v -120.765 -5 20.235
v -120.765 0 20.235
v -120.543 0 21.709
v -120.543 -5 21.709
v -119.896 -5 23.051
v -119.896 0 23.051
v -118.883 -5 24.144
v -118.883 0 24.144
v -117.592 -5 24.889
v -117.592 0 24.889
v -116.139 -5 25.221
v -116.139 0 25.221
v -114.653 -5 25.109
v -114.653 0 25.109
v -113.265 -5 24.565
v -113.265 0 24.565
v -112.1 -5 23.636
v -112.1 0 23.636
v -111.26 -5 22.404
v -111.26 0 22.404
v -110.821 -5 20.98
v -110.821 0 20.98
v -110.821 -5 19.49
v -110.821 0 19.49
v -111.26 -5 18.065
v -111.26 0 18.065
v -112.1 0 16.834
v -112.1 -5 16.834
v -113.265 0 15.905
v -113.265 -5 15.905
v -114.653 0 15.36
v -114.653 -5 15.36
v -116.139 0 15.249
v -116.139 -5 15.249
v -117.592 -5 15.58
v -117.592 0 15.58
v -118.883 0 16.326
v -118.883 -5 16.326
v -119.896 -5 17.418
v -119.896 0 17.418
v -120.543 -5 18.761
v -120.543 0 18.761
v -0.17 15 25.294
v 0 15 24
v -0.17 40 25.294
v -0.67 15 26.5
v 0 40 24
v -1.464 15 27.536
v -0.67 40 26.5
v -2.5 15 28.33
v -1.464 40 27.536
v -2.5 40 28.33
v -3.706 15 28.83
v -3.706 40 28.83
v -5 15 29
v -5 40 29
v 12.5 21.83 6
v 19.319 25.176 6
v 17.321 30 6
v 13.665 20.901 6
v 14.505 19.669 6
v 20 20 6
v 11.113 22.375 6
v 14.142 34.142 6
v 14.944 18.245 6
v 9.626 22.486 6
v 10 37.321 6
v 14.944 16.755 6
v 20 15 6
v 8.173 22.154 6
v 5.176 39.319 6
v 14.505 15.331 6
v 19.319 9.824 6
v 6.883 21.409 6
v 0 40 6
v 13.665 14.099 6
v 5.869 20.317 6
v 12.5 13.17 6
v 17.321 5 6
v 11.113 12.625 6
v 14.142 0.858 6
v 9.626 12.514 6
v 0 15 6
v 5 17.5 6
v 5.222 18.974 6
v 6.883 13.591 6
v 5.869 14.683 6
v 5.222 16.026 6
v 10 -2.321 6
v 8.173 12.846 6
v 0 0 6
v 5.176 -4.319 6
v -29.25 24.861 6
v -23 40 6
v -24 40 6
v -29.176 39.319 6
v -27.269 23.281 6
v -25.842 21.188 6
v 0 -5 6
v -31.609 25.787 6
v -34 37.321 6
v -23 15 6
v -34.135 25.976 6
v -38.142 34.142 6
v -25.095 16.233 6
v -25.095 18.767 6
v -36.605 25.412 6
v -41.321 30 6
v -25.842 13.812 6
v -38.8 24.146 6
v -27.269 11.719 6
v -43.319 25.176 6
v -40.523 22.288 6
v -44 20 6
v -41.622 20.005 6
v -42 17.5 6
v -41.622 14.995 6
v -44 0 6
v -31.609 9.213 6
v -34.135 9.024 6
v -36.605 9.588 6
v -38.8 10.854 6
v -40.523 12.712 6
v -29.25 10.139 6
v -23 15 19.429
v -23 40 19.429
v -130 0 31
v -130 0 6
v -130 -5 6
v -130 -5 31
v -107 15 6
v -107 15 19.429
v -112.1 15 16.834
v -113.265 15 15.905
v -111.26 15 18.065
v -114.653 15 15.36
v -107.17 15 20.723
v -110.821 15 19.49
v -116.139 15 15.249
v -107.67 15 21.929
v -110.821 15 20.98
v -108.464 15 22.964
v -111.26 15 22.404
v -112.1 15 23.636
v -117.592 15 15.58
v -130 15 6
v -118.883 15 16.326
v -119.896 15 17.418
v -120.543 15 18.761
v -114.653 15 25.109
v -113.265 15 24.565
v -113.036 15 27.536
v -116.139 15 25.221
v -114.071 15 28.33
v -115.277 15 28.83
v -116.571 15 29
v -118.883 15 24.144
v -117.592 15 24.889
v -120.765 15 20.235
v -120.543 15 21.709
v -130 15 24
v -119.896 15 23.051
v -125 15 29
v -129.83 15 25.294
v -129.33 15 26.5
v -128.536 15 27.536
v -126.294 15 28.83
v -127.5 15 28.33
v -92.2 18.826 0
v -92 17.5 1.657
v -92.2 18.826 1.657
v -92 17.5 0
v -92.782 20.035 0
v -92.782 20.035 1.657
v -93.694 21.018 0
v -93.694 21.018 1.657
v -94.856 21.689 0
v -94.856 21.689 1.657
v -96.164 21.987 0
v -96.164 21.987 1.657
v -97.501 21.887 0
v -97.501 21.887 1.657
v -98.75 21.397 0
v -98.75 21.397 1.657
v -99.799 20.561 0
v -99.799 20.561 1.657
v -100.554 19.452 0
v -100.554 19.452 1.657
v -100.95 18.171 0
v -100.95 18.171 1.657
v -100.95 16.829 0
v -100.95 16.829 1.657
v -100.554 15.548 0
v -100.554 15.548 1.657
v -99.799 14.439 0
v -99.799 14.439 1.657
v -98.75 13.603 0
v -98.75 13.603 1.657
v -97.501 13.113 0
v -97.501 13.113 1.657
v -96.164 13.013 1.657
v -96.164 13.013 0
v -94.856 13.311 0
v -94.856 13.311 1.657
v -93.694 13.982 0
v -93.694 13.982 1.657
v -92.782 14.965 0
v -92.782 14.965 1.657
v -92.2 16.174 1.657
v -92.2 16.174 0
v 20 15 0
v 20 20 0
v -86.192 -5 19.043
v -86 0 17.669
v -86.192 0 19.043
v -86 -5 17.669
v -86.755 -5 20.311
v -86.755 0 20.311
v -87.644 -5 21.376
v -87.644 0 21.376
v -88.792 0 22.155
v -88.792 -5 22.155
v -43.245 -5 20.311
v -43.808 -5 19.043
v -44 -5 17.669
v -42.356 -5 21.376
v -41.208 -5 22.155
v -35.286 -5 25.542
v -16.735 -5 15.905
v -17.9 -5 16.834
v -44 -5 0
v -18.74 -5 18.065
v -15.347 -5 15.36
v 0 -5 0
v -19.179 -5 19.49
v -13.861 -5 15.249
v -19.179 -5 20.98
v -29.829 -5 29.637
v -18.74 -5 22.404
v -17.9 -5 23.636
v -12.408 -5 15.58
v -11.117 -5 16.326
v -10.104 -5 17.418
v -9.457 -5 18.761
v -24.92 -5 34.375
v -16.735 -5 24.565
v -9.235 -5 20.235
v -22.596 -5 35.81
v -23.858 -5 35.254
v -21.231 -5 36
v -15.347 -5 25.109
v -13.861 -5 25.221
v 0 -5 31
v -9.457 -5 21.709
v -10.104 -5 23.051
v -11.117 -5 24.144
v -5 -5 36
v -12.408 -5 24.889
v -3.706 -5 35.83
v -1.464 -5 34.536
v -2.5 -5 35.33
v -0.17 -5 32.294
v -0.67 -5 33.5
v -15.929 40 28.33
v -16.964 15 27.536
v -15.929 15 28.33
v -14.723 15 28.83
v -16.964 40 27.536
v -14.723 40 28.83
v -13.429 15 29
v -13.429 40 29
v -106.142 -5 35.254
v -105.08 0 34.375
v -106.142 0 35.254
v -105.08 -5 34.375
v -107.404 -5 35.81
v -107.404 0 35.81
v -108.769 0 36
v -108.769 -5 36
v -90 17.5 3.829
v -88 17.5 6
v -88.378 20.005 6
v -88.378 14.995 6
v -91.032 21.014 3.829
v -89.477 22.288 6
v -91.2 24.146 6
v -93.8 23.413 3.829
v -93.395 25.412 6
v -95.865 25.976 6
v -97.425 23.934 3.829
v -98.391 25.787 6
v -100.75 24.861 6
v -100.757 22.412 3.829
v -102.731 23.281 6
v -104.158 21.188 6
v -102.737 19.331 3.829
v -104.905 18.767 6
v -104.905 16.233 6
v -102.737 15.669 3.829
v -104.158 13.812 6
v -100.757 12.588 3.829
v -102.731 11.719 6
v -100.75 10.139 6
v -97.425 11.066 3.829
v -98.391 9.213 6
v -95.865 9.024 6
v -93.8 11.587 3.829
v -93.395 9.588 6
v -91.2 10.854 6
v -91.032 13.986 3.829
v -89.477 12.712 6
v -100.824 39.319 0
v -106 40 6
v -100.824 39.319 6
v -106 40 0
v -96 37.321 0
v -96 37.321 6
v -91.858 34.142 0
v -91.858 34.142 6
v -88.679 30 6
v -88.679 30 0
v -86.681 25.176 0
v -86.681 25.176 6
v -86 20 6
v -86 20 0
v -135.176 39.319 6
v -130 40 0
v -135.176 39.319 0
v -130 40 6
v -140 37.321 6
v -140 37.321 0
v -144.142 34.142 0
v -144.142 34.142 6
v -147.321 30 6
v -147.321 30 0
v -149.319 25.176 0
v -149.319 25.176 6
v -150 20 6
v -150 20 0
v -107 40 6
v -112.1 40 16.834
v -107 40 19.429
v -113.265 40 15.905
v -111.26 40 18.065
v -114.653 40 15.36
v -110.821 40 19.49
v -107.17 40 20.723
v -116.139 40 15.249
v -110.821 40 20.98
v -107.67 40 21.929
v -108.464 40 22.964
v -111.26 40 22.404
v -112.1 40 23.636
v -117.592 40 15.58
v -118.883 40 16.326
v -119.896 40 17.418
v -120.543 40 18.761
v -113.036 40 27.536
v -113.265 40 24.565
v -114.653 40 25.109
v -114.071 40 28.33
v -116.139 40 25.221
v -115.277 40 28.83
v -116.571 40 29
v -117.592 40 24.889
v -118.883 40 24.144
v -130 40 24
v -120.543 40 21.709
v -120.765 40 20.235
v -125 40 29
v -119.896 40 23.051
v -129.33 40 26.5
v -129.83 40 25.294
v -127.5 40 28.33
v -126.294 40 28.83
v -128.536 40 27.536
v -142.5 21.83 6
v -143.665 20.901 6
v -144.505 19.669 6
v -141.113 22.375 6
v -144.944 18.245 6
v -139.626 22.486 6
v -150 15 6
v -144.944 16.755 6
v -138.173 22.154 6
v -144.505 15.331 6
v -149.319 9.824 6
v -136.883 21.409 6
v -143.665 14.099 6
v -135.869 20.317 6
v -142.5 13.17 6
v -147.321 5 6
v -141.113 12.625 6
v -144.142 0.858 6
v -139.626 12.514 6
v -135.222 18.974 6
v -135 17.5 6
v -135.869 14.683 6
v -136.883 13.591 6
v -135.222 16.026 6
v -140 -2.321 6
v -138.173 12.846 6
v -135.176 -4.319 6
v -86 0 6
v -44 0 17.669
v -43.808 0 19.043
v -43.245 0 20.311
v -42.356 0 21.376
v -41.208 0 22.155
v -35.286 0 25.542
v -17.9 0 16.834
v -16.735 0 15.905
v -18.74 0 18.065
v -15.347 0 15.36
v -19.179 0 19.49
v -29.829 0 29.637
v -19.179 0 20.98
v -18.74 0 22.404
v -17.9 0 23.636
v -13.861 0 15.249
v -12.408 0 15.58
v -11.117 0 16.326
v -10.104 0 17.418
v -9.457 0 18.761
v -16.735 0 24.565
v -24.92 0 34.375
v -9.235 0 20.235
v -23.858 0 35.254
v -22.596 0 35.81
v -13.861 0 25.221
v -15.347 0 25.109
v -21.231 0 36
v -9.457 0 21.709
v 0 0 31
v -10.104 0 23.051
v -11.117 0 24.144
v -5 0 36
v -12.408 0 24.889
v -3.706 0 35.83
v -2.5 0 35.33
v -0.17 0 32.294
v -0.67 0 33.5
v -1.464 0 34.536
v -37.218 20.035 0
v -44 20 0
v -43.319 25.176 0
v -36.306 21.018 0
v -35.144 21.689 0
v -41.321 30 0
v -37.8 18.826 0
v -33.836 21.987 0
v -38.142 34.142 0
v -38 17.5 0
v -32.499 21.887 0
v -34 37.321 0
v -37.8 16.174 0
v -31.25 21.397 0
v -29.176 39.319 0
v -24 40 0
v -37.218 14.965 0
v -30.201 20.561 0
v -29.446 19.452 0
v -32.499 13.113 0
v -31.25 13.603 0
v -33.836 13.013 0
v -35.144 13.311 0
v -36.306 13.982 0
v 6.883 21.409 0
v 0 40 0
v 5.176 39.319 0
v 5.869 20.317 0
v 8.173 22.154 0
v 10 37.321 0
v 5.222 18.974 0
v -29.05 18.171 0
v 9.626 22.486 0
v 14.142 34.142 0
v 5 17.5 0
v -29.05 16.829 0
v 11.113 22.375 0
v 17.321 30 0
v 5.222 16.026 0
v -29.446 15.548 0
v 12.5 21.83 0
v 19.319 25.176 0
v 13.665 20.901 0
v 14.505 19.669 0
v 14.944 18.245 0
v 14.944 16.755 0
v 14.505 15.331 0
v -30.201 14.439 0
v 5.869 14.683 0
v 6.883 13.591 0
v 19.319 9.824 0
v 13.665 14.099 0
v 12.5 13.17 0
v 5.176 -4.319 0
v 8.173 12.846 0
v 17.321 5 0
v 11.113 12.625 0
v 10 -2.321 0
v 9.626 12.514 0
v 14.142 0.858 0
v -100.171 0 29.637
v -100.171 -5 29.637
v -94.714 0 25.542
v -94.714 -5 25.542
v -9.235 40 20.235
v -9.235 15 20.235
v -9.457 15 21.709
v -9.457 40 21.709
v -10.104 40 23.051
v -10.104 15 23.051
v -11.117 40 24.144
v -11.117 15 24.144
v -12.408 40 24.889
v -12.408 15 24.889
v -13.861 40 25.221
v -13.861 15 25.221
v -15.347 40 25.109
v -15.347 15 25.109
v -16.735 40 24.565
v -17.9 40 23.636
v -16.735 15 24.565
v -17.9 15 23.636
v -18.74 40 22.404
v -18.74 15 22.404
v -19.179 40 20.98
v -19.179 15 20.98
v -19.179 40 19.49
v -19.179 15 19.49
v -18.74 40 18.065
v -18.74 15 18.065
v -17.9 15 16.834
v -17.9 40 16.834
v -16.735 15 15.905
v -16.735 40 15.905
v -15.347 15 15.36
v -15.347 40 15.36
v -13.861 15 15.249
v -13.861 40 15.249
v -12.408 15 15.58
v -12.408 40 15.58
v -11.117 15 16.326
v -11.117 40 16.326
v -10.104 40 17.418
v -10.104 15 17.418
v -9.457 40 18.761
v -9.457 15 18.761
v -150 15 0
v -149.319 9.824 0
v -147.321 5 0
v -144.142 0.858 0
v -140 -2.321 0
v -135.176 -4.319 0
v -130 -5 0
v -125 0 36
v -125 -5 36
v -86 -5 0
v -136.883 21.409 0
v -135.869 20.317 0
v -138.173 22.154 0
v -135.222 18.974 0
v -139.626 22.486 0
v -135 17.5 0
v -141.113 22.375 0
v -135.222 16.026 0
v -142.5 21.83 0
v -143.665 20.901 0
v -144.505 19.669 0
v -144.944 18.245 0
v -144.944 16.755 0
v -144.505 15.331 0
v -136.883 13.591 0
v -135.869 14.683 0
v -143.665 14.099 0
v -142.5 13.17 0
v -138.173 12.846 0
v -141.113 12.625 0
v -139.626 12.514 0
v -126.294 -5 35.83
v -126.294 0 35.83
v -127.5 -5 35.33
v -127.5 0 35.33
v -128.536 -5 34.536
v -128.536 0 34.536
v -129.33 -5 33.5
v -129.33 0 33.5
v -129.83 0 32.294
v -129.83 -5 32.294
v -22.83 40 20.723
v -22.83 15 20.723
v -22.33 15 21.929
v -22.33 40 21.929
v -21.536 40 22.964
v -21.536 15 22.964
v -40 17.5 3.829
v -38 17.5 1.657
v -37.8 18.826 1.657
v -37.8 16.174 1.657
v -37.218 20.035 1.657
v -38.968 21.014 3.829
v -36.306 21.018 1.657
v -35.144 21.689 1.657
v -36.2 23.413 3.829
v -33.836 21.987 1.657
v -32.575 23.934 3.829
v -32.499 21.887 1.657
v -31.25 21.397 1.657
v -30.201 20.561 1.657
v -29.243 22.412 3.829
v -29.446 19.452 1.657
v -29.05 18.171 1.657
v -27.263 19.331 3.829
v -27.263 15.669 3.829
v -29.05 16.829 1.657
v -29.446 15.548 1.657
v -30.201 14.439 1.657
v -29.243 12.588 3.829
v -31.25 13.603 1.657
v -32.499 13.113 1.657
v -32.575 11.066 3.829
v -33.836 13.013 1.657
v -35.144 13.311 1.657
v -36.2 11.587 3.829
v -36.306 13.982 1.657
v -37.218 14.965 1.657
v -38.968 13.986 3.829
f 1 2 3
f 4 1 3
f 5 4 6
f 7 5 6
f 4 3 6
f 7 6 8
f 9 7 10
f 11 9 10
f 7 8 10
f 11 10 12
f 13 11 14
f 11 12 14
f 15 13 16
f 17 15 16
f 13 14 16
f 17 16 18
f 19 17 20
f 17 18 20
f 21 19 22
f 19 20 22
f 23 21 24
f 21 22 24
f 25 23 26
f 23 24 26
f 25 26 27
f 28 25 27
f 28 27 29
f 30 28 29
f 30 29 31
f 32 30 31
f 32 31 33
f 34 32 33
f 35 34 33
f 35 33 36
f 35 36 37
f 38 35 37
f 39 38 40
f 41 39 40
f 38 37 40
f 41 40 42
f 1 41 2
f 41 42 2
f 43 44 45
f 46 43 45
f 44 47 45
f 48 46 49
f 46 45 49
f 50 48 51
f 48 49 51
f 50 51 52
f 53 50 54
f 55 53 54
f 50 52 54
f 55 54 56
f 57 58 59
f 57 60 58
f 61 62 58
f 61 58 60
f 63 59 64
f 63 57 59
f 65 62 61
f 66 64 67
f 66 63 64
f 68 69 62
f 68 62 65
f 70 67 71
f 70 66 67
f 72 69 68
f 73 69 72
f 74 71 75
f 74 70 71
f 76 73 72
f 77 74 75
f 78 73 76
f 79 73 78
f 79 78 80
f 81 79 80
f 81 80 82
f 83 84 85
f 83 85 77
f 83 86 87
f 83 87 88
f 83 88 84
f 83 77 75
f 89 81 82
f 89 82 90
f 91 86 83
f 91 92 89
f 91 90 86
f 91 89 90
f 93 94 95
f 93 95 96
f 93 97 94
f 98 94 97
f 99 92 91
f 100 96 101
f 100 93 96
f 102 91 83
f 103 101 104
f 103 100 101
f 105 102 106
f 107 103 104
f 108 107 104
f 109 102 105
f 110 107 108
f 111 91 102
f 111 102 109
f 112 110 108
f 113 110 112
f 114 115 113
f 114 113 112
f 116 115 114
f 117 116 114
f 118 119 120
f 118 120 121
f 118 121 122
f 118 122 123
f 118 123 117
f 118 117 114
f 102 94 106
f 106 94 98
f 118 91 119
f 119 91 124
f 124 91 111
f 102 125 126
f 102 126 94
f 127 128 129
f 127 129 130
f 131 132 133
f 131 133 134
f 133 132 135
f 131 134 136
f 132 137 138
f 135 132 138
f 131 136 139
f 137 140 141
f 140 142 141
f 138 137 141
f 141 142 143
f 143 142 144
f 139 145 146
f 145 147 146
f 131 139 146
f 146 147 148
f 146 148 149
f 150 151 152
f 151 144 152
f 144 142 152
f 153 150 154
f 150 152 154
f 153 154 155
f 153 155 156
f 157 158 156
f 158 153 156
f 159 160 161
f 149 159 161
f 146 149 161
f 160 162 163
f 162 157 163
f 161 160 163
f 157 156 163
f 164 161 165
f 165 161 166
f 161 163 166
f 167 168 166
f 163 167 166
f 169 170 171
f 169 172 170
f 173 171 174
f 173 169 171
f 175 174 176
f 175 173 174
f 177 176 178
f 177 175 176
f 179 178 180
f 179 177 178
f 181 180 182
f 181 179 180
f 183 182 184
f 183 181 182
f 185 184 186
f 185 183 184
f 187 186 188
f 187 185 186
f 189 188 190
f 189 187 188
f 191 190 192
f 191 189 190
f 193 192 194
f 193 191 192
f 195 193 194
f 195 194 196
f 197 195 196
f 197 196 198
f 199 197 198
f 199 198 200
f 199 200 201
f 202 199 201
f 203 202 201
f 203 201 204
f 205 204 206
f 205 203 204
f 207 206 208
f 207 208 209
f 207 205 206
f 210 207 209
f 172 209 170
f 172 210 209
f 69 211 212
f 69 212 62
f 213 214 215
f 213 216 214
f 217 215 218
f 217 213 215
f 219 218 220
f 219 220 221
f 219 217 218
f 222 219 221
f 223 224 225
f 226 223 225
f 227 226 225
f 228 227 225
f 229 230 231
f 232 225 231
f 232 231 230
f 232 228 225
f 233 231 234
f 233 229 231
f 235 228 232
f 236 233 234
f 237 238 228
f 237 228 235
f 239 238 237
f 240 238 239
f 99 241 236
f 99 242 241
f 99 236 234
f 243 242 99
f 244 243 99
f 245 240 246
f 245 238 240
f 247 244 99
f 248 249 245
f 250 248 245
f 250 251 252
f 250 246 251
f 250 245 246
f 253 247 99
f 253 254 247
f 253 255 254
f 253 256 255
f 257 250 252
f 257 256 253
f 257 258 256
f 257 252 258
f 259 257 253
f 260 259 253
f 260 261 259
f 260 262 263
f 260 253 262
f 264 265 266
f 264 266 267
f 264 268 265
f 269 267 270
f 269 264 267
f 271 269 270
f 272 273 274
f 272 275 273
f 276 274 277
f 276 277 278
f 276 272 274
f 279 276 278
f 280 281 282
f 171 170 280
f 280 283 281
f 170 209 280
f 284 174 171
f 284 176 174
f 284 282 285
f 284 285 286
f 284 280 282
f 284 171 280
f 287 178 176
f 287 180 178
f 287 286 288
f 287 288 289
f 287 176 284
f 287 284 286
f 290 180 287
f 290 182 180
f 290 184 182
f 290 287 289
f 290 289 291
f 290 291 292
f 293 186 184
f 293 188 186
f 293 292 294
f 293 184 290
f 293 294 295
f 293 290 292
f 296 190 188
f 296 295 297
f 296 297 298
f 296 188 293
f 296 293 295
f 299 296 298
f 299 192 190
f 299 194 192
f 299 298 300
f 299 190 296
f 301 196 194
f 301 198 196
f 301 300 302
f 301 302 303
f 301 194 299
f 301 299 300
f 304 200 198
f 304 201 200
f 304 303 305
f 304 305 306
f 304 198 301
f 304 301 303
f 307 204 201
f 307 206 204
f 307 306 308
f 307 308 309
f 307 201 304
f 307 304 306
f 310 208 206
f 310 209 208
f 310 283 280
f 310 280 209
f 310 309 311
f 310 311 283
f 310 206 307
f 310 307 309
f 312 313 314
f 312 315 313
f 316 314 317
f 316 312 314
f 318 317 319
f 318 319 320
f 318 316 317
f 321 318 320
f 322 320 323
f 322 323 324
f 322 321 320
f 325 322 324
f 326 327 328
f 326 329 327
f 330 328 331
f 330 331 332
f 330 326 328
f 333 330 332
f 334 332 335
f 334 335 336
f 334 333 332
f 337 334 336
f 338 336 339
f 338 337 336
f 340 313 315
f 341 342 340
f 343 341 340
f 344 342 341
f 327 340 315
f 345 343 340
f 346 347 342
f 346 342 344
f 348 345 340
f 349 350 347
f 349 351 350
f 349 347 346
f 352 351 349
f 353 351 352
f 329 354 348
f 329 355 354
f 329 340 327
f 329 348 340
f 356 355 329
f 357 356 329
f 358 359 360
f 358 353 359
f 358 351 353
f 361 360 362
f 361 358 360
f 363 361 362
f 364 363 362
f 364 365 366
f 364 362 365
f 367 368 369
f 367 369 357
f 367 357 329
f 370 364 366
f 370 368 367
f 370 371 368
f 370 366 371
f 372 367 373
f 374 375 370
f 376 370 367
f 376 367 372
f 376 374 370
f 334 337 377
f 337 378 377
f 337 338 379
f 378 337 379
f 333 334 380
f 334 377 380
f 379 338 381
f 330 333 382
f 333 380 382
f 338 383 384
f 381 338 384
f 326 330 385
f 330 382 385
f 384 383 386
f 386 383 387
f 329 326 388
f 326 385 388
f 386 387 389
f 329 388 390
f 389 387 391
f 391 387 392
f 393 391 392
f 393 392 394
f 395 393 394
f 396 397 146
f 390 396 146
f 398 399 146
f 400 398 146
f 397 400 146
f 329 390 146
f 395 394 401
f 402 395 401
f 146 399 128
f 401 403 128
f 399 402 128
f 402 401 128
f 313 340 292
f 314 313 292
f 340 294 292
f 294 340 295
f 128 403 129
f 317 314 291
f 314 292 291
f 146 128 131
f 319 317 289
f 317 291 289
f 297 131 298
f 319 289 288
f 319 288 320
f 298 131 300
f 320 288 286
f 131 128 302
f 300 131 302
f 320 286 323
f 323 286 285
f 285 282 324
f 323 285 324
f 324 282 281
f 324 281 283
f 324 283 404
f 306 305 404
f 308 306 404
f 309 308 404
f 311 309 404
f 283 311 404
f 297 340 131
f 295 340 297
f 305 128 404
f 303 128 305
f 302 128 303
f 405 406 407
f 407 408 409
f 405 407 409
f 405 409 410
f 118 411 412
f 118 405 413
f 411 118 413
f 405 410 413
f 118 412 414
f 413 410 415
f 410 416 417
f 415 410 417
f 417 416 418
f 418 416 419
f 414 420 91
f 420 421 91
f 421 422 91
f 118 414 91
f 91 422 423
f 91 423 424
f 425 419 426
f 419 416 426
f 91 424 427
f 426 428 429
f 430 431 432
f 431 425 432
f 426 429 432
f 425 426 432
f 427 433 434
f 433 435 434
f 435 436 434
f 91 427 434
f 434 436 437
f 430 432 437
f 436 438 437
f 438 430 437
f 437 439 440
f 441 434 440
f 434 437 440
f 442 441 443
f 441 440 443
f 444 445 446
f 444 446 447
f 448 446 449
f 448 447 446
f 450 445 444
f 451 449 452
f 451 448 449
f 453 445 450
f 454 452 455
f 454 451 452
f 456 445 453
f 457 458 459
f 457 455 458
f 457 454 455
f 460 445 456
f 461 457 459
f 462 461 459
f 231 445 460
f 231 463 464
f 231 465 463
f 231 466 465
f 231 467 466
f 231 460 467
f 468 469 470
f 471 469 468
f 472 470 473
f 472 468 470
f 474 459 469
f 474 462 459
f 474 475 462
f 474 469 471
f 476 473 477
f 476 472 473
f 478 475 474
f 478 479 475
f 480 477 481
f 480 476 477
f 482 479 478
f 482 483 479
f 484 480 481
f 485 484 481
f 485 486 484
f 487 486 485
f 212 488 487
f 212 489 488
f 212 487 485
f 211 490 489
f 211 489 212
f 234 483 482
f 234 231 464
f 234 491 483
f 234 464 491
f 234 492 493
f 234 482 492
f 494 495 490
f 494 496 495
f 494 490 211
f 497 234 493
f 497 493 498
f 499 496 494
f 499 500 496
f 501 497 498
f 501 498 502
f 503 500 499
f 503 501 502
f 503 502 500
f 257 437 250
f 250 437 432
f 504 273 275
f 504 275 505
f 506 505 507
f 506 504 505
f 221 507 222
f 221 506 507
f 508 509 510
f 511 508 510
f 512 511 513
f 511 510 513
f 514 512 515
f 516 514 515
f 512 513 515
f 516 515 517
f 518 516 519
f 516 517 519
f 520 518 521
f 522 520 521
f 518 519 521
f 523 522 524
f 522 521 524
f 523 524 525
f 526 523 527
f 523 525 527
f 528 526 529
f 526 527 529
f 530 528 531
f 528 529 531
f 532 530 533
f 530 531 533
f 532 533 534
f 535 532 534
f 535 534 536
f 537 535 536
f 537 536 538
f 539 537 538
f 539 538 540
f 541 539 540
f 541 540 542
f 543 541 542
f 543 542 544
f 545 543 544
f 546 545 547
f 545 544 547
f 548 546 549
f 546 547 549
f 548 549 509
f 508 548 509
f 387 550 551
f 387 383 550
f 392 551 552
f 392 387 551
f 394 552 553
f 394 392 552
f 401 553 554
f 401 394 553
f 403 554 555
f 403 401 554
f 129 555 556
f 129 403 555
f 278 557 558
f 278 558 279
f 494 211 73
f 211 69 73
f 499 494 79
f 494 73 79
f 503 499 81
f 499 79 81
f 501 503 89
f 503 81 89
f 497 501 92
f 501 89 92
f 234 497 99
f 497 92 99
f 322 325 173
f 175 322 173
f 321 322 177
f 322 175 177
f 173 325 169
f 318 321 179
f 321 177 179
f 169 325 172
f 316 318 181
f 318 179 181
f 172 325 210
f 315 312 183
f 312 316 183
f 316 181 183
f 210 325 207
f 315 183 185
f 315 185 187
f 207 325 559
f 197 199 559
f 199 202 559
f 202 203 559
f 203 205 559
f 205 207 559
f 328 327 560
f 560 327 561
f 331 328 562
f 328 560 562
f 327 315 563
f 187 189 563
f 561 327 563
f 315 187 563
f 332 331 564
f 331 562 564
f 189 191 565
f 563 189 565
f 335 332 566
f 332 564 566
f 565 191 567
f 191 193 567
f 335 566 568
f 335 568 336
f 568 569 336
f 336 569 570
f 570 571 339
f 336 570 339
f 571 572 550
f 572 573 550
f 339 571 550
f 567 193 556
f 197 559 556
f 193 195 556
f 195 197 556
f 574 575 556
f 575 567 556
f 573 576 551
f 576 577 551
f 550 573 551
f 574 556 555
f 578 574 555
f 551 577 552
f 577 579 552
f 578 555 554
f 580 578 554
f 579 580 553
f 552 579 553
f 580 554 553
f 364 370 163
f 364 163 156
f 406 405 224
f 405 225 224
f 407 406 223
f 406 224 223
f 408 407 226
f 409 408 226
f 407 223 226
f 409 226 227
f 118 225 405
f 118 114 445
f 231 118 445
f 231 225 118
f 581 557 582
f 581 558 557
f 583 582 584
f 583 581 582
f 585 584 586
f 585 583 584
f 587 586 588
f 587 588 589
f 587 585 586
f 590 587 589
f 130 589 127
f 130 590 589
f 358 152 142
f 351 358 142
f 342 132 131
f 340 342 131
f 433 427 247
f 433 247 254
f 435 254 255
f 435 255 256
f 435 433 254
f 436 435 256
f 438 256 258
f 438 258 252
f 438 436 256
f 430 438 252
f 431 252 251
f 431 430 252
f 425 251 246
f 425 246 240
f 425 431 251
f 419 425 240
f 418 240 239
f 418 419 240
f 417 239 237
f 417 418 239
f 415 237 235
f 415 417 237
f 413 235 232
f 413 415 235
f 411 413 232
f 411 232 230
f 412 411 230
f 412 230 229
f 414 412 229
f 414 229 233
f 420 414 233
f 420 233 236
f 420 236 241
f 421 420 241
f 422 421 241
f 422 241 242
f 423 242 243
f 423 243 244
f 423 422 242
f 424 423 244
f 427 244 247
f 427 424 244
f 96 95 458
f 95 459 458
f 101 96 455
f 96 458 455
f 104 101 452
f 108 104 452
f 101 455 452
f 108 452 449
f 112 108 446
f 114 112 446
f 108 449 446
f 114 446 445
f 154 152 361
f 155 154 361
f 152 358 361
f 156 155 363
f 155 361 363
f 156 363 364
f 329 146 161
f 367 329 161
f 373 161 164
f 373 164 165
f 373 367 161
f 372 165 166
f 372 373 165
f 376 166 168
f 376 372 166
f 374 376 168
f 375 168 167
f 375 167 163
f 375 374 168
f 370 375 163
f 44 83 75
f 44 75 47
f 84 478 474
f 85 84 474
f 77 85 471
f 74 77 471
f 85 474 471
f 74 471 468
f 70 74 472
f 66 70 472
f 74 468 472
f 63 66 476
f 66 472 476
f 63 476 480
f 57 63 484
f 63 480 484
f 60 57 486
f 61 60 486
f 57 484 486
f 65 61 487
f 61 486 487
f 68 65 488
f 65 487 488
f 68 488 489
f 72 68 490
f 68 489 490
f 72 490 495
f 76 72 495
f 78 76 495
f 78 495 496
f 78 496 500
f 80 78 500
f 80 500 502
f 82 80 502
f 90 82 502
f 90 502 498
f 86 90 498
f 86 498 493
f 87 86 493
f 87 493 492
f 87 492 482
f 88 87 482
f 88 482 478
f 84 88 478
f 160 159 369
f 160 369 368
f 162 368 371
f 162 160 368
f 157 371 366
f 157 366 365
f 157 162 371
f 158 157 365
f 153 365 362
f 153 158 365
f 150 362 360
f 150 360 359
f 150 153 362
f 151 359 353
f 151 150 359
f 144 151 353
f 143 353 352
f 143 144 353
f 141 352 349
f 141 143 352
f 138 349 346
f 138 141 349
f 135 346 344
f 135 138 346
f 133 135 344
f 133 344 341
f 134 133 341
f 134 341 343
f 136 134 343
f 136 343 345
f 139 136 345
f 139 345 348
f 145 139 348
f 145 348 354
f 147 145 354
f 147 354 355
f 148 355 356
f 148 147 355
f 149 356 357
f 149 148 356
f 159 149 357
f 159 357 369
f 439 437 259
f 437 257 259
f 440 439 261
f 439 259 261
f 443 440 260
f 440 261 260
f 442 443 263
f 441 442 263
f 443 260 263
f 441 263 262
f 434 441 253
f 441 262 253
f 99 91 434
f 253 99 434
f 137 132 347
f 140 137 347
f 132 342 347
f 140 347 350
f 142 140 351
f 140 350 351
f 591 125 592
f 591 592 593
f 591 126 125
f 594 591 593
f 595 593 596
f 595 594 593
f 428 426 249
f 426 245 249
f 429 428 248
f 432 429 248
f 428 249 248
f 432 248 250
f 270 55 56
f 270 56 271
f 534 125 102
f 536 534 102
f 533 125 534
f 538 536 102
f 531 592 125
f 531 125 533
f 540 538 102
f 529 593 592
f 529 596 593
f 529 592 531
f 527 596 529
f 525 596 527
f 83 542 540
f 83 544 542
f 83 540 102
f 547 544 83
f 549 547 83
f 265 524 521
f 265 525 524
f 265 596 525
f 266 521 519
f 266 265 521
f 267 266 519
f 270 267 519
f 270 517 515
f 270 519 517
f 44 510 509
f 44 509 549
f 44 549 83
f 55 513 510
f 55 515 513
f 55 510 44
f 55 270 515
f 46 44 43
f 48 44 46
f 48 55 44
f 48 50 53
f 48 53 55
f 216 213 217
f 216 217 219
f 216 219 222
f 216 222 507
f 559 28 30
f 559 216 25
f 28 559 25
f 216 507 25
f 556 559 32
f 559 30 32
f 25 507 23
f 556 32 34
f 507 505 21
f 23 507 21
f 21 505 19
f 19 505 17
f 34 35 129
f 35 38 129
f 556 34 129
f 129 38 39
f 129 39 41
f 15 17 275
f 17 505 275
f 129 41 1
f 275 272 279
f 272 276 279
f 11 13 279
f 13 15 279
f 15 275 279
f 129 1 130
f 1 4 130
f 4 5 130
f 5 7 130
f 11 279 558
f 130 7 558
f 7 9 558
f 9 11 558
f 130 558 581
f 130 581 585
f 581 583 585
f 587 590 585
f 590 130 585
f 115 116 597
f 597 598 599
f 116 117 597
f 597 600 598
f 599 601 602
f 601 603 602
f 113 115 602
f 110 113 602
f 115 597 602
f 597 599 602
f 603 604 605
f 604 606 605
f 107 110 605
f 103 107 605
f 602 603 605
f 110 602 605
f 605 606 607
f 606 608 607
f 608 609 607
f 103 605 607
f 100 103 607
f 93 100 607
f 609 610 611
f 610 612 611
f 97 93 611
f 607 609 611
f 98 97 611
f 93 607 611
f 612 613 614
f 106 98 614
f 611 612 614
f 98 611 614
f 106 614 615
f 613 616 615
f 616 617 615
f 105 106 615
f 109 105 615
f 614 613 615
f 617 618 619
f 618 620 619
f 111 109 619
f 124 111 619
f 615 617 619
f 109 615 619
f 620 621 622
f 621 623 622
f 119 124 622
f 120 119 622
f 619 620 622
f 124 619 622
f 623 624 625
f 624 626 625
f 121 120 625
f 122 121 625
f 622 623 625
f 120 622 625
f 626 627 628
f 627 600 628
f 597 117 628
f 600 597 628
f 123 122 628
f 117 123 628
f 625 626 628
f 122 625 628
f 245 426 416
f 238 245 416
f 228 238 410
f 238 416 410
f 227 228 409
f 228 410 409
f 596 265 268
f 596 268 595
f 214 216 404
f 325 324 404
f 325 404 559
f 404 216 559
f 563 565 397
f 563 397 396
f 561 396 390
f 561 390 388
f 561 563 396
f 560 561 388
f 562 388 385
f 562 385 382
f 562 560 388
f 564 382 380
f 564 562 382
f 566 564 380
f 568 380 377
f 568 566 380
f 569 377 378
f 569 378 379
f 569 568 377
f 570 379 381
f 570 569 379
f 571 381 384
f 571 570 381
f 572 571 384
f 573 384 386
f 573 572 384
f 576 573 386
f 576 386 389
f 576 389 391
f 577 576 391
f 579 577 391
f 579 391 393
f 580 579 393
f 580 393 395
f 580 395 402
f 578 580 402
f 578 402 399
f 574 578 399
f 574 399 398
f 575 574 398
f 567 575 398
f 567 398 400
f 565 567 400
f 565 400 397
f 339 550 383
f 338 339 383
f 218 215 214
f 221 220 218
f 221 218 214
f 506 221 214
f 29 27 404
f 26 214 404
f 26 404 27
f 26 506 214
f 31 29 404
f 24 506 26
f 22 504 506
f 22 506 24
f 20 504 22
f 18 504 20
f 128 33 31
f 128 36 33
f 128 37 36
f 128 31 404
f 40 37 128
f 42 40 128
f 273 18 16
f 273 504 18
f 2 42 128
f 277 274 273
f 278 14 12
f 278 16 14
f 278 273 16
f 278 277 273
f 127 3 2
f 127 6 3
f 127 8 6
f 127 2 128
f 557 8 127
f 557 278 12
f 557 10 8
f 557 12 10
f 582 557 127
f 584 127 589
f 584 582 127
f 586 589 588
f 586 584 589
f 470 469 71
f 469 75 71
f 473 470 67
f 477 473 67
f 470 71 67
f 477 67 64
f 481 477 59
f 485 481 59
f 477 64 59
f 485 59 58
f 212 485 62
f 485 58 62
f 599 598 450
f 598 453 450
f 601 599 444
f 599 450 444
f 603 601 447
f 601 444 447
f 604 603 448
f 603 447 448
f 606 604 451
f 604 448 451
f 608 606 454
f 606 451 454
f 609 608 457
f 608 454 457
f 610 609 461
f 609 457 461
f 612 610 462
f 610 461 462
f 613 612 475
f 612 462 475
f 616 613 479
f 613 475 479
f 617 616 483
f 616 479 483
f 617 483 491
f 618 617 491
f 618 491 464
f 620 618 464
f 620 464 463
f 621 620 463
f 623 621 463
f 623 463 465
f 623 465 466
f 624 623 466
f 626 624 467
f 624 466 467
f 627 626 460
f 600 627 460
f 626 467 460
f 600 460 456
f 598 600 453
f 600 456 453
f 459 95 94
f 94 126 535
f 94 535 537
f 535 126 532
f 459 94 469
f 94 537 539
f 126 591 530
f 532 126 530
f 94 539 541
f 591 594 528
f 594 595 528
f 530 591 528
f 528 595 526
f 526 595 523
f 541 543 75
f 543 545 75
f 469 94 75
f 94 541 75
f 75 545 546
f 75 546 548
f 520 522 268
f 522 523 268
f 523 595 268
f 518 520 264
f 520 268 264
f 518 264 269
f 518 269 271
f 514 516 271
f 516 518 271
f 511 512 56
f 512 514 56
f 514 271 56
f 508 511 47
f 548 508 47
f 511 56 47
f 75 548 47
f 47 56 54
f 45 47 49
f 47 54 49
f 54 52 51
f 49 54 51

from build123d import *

# Parameters (mm, degrees)
F3_R            = 5
F6_DEPTH        = 5
F7_DEPTH        = 40
F4_R            = 5
F8_DEPTH        = 25
F9_R            = 5
F10_R           = 20
F11_D           = 9
F11_DEPTH       = 8
F11_CSINK_D     = 17
F11_CSINK_ANGLE = 85.294
F12_D           = 10
F12_DEPTH       = 8


with BuildPart() as f6:
    # F3 (on Front) → F6 (new body)
    with BuildSketch(Plane.XZ):
        Polygon((-44, 0), (0, 0), (20, 0), (20, 6), (0, 6), (-44, 6), align=None)
        with BuildLine():
            Line((-44, 20.876389), (-44, 6))
            Line((-44, 6), (0, 6))
            Line((0, 6), (0, 36))
            Line((0, 36), (-23.491072, 36))
            ThreePointArc((-23.491072, 36), (-32.857591, 27.234064), (-44, 20.876389))
        make_face()
        with Locations((-14.234758, 20.234758)):
            Circle(F3_R, mode=Mode.SUBTRACT)
    extrude(amount=F6_DEPTH)

    # F3 (on Front) → F7 (join)
    with BuildSketch(Plane.XZ):
        Polygon((-44, 0), (0, 0), (20, 0), (20, 6), (0, 6), (-44, 6), align=None)
    extrude(amount=-F7_DEPTH)

    # F4 (on offset) → F8 (join)
    with BuildSketch(Plane.XZ.offset(-15)):
        Polygon((-23, 6), (0, 6), (0, 29), (-15.5, 29), (-23, 21.5), align=None)
        with Locations((-14.234758, 20.234758)):
            Circle(F4_R, mode=Mode.SUBTRACT)
    extrude(amount=-F8_DEPTH)

    # F9
    f9_edges = [f6.edges().sort_by_distance(p)[0] for p in [
        (-15.5, 27.5, 29),
        (-23, 27.5, 21.5),
        (0, 27.5, 29),
        (-23.491072, -2.5, 36),
        (-44, -2.5, 20.876389),
        (0, -2.5, 36),
    ]]
    fillet(f9_edges, radius=F9_R)

    # F10
    f10_edges = [f6.edges().sort_by_distance(p)[0] for p in [
        (20, -5, 3),
        (20, 40, 3),
        (-44, 40, 3),
    ]]
    fillet(f10_edges, radius=F10_R)

    # F11
    with Locations(Plane.XY.offset(6)):
        with Locations((-33.5, 17.5)):
            CounterSinkHole(F11_D / 2, F11_CSINK_D / 2, depth=F11_DEPTH, counter_sink_angle=F11_CSINK_ANGLE)

    # F12
    with Locations(Plane.XY.offset(6)):
        with Locations((10, 17.5)):
            Hole(F12_D / 2, depth=F12_DEPTH)


with BuildPart() as f14_1:
    # F14: instance of F6
    add(f6.part.mirror(Plane.YZ.offset(-65)))


solid = Compound([f6.part, f14_1.part])
